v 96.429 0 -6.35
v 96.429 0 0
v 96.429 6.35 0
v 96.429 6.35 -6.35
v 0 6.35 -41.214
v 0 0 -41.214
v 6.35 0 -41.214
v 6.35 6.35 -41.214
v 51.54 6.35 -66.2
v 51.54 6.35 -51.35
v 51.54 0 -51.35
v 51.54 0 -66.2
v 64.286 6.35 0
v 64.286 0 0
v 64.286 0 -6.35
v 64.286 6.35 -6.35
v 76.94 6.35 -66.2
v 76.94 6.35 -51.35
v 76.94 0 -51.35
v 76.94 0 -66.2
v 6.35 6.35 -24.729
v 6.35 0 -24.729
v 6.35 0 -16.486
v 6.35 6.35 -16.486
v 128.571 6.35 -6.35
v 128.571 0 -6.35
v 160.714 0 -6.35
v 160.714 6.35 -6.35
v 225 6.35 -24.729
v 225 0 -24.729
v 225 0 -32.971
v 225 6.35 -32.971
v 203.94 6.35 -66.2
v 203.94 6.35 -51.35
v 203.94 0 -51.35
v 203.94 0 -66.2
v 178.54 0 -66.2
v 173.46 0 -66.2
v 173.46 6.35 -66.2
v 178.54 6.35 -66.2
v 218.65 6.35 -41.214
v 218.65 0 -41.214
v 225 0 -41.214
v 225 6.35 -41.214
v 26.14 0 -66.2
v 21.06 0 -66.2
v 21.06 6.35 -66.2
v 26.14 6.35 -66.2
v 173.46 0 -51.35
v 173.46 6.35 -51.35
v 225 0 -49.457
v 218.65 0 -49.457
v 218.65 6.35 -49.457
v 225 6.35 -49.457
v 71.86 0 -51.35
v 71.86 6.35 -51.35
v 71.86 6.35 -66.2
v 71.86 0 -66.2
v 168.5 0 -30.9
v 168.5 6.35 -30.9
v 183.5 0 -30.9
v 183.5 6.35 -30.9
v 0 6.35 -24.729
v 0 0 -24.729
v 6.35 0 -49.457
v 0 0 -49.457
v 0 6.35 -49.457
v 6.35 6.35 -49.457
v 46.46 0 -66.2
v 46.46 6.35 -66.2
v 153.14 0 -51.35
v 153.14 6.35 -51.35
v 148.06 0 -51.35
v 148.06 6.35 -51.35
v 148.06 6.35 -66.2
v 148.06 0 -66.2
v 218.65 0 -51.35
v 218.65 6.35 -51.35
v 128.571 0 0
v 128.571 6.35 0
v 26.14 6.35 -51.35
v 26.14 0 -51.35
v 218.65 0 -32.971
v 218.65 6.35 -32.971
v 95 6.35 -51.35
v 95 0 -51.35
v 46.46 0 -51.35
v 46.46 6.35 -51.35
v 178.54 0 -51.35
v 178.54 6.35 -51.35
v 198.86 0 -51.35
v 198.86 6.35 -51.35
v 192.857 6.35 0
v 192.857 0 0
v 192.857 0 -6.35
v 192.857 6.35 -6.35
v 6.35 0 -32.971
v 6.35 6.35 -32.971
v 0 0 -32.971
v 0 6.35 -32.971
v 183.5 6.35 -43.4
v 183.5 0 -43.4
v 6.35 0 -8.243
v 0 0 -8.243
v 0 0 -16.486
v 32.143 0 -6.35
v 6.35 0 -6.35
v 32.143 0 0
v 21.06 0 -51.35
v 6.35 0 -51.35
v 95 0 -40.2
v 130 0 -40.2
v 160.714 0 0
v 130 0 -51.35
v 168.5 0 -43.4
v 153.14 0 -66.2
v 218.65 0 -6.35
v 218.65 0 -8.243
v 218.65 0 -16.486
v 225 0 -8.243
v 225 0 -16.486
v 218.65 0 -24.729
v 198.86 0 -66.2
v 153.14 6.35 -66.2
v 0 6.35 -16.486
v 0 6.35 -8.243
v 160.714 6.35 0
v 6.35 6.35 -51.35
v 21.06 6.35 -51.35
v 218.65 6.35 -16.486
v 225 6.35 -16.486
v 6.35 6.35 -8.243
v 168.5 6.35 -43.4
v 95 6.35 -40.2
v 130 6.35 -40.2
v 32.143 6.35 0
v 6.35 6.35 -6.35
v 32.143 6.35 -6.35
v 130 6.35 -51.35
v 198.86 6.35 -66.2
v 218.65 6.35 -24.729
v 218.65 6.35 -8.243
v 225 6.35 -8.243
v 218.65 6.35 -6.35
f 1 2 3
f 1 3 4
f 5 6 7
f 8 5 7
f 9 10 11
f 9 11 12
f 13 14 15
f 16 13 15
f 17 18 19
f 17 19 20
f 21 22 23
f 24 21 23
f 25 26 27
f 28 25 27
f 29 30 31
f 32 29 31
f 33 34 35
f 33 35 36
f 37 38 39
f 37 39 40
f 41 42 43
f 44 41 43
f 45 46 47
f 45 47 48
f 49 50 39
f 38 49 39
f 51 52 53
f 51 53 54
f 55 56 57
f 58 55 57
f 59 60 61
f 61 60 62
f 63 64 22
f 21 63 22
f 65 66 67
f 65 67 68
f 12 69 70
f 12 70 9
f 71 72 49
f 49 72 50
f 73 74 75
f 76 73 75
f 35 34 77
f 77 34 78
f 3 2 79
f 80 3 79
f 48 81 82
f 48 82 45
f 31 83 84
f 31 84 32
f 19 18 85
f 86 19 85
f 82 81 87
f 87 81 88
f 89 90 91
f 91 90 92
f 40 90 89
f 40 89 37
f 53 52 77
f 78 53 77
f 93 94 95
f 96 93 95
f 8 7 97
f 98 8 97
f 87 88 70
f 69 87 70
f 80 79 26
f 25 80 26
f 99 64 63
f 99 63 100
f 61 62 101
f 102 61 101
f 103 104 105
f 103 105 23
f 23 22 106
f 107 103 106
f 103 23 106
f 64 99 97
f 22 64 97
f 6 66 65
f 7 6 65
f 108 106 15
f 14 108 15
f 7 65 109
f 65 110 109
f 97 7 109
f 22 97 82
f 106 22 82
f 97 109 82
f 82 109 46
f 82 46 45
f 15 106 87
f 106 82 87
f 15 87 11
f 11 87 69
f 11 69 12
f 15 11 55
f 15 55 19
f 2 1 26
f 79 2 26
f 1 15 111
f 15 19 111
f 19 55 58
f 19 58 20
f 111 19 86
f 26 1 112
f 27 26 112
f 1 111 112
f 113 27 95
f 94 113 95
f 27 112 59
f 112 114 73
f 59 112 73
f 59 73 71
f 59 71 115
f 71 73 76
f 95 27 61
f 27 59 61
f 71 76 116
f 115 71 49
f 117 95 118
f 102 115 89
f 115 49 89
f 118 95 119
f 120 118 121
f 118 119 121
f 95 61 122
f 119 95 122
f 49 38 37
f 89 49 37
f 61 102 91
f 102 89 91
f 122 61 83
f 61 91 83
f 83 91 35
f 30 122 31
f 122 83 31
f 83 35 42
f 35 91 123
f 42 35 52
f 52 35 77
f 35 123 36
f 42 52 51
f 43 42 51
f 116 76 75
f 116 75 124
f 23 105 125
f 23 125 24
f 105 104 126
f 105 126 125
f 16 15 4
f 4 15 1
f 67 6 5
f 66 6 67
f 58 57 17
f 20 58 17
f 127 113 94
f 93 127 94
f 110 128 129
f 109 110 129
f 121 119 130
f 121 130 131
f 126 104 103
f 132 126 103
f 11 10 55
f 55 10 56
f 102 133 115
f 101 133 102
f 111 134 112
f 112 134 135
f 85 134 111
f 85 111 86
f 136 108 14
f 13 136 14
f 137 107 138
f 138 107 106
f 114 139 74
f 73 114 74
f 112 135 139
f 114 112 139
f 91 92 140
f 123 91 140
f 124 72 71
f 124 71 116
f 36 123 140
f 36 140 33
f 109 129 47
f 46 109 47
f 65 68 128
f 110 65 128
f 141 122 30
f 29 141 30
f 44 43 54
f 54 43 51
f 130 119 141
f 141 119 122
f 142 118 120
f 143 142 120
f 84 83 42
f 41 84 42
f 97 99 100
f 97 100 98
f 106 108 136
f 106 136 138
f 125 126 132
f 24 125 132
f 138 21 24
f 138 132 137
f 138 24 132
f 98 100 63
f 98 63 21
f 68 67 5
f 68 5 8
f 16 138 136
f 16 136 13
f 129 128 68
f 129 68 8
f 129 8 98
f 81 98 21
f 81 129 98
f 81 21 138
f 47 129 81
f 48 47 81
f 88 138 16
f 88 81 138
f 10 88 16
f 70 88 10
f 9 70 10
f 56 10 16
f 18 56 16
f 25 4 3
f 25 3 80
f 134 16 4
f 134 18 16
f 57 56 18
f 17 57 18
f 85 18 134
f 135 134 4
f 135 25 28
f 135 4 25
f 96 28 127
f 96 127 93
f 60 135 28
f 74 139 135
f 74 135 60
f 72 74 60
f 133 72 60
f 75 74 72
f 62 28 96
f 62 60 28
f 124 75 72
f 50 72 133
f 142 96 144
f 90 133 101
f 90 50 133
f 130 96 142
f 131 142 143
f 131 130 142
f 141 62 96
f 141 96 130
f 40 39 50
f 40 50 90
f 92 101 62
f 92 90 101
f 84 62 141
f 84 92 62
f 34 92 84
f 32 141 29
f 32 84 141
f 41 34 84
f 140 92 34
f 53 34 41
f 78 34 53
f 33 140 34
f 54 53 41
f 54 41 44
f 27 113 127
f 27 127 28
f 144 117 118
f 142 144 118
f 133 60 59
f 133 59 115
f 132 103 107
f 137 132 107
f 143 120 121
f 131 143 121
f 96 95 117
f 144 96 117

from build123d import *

# Parameters (mm, degrees)
SKETCH1_W           = 32.142857142
SKETCH1_H           = 6.35
SKETCH1_W_2         = 32.142857143
SKETCH1_W_3         = 6.35
SKETCH1_H_2         = 8.242857143
SKETCH1_H_3         = 8.242857142
BOSS_EXTRUDE1_DEPTH = 6.35
SKETCH2_W           = 212.3
SKETCH2_H           = 6.35
SKETCH2_W_2         = 5.08
SKETCH2_H_2         = 8.5
BOSS_EXTRUDE2_DEPTH = 6.35
SKETCH3_W           = 35
SKETCH3_H           = 26
CUT_EXTRUDE1_DEPTH  = 235.622595885
SKETCH4_W           = 14.71
SKETCH4_H           = 6.35
SKETCH4_W_2         = 20.32
CUT_EXTRUDE2_DEPTH  = 6.35
SKETCH5_W           = 20.32
SKETCH5_H           = 6.35
SKETCH5_W_2         = 18.06
CUT_EXTRUDE3_DEPTH  = 235.622595885
SKETCH8_W           = 15
SKETCH8_H           = 12.5
CUT_EXTRUDE6_DEPTH  = 235.622595885


with BuildPart() as part:
    # Sketch1 → Boss-Extrude1 (new body)
    with BuildSketch(Plane(origin=(0, 0, 0), x_dir=(1, 0, 0), z_dir=(0, 1, 0))):
        Polygon((6.35, 6.35), (32.142857143, 6.35), (64.285714286, 6.35), (96.428571429, 6.35), (128.571428571, 6.35), (160.714285714, 6.35), (192.857142857, 6.35), (218.65, 6.35), (218.65, 8.242857143), (218.65, 16.485714286), (218.65, 24.728571429), (218.65, 32.971428571), (218.65, 41.214285714), (218.65, 49.457142857), (218.65, 51.35), (192.857142857, 51.35), (160.714285714, 51.35), (128.571428571, 51.35), (96.428571429, 51.35), (64.285714286, 51.35), (32.142857143, 51.35), (6.35, 51.35), (6.35, 49.457142857), (6.35, 41.214285714), (6.35, 32.971428571), (6.35, 24.728571429), (6.35, 16.485714286), (6.35, 8.242857143), align=None)
        with Locations((112.5, 54.525)):
            Rectangle(SKETCH1_W, SKETCH1_H)
        with Locations((112.5, 3.175)):
            Rectangle(SKETCH1_W, SKETCH1_H)
        with Locations((176.785714286, 3.175)):
            Rectangle(SKETCH1_W_2, SKETCH1_H)
        with Locations((176.785714286, 54.525)):
            Rectangle(SKETCH1_W_2, SKETCH1_H)
        with Locations((48.214285715, 54.525)):
            Rectangle(SKETCH1_W_2, SKETCH1_H)
        with Locations((48.214285715, 3.175)):
            Rectangle(SKETCH1_W_2, SKETCH1_H)
        with Locations((3.175, 12.364285714)):
            Rectangle(SKETCH1_W_3, SKETCH1_H_2)
        with Locations((3.175, 28.85)):
            Rectangle(SKETCH1_W_3, SKETCH1_H_3)
        with Locations((3.175, 45.335714286)):
            Rectangle(SKETCH1_W_3, SKETCH1_H_2)
        with Locations((221.825, 12.364285714)):
            Rectangle(SKETCH1_W_3, SKETCH1_H_2)
        with Locations((221.825, 28.85)):
            Rectangle(SKETCH1_W_3, SKETCH1_H_3)
        with Locations((221.825, 45.335714286)):
            Rectangle(SKETCH1_W_3, SKETCH1_H_2)
    extrude(amount=BOSS_EXTRUDE1_DEPTH)

    # Sketch2 → Boss-Extrude2 (add)
    with BuildSketch(Plane(origin=(0, 6.35, 0), x_dir=(1, 0, 0), z_dir=(0, 1, 0))):
        with Locations((112.5, 54.525)):
            Rectangle(SKETCH2_W, SKETCH2_H)
        with Locations((23.6, 61.95)):
            Rectangle(SKETCH2_W_2, SKETCH2_H_2)
        with Locations((49, 61.95)):
            Rectangle(SKETCH2_W_2, SKETCH2_H_2)
        with Locations((74.4, 61.95)):
            Rectangle(SKETCH2_W_2, SKETCH2_H_2)
        with Locations((99.8, 61.95)):
            Rectangle(SKETCH2_W_2, SKETCH2_H_2)
        with Locations((201.4, 61.95)):
            Rectangle(SKETCH2_W_2, SKETCH2_H_2)
        with Locations((176, 61.95)):
            Rectangle(SKETCH2_W_2, SKETCH2_H_2)
        with Locations((125.2, 61.95)):
            Rectangle(SKETCH2_W_2, SKETCH2_H_2)
        with Locations((150.6, 61.95)):
            Rectangle(SKETCH2_W_2, SKETCH2_H_2)
    extrude(amount=-BOSS_EXTRUDE2_DEPTH)

    # Sketch3 → Cut-Extrude1 (cut, through all)
    with BuildSketch(Plane(origin=(0, 6.35, 0), x_dir=(1, 0, 0), z_dir=(0, 1, 0))):
        with Locations((112.5, 53.2)):
            Rectangle(SKETCH3_W, SKETCH3_H)
    extrude(amount=-CUT_EXTRUDE1_DEPTH, mode=Mode.SUBTRACT)

    # Sketch4 → Cut-Extrude2 (cut)
    with BuildSketch(Plane(origin=(0, 6.35, 0), x_dir=(1, 0, 0), z_dir=(0, 1, 0))):
        with Locations((13.705, 54.525)):
            Rectangle(SKETCH4_W, SKETCH4_H)
        with Locations((36.3, 54.525)):
            Rectangle(SKETCH4_W_2, SKETCH4_H)
        with Locations((211.295, 54.525)):
            Rectangle(SKETCH4_W, SKETCH4_H)
        with Locations((188.7, 54.525)):
            Rectangle(SKETCH4_W_2, SKETCH4_H)
    extrude(amount=-CUT_EXTRUDE2_DEPTH, mode=Mode.SUBTRACT)

    # Sketch5 → Cut-Extrude3 (cut, through all)
    with BuildSketch(Plane(origin=(0, 6.35, 0), x_dir=(1, 0, 0), z_dir=(0, 1, 0))):
        with Locations((61.7, 54.525)):
            Rectangle(SKETCH5_W, SKETCH5_H)
        with Locations((85.97, 54.525)):
            Rectangle(SKETCH5_W_2, SKETCH5_H)
        with Locations((139.03, 54.525)):
            Rectangle(SKETCH5_W_2, SKETCH5_H)
        with Locations((163.3, 54.525)):
            Rectangle(SKETCH5_W, SKETCH5_H)
    extrude(amount=-CUT_EXTRUDE3_DEPTH, mode=Mode.SUBTRACT)

    # Sketch8 → Cut-Extrude6 (cut, through all)
    with BuildSketch(Plane(origin=(0, 6.35, 0), x_dir=(1, 0, 0), z_dir=(0, 1, 0))):
        with Locations((176, 37.15)):
            Rectangle(SKETCH8_W, SKETCH8_H)
    extrude(amount=-CUT_EXTRUDE6_DEPTH, mode=Mode.SUBTRACT)


solid = part.part
